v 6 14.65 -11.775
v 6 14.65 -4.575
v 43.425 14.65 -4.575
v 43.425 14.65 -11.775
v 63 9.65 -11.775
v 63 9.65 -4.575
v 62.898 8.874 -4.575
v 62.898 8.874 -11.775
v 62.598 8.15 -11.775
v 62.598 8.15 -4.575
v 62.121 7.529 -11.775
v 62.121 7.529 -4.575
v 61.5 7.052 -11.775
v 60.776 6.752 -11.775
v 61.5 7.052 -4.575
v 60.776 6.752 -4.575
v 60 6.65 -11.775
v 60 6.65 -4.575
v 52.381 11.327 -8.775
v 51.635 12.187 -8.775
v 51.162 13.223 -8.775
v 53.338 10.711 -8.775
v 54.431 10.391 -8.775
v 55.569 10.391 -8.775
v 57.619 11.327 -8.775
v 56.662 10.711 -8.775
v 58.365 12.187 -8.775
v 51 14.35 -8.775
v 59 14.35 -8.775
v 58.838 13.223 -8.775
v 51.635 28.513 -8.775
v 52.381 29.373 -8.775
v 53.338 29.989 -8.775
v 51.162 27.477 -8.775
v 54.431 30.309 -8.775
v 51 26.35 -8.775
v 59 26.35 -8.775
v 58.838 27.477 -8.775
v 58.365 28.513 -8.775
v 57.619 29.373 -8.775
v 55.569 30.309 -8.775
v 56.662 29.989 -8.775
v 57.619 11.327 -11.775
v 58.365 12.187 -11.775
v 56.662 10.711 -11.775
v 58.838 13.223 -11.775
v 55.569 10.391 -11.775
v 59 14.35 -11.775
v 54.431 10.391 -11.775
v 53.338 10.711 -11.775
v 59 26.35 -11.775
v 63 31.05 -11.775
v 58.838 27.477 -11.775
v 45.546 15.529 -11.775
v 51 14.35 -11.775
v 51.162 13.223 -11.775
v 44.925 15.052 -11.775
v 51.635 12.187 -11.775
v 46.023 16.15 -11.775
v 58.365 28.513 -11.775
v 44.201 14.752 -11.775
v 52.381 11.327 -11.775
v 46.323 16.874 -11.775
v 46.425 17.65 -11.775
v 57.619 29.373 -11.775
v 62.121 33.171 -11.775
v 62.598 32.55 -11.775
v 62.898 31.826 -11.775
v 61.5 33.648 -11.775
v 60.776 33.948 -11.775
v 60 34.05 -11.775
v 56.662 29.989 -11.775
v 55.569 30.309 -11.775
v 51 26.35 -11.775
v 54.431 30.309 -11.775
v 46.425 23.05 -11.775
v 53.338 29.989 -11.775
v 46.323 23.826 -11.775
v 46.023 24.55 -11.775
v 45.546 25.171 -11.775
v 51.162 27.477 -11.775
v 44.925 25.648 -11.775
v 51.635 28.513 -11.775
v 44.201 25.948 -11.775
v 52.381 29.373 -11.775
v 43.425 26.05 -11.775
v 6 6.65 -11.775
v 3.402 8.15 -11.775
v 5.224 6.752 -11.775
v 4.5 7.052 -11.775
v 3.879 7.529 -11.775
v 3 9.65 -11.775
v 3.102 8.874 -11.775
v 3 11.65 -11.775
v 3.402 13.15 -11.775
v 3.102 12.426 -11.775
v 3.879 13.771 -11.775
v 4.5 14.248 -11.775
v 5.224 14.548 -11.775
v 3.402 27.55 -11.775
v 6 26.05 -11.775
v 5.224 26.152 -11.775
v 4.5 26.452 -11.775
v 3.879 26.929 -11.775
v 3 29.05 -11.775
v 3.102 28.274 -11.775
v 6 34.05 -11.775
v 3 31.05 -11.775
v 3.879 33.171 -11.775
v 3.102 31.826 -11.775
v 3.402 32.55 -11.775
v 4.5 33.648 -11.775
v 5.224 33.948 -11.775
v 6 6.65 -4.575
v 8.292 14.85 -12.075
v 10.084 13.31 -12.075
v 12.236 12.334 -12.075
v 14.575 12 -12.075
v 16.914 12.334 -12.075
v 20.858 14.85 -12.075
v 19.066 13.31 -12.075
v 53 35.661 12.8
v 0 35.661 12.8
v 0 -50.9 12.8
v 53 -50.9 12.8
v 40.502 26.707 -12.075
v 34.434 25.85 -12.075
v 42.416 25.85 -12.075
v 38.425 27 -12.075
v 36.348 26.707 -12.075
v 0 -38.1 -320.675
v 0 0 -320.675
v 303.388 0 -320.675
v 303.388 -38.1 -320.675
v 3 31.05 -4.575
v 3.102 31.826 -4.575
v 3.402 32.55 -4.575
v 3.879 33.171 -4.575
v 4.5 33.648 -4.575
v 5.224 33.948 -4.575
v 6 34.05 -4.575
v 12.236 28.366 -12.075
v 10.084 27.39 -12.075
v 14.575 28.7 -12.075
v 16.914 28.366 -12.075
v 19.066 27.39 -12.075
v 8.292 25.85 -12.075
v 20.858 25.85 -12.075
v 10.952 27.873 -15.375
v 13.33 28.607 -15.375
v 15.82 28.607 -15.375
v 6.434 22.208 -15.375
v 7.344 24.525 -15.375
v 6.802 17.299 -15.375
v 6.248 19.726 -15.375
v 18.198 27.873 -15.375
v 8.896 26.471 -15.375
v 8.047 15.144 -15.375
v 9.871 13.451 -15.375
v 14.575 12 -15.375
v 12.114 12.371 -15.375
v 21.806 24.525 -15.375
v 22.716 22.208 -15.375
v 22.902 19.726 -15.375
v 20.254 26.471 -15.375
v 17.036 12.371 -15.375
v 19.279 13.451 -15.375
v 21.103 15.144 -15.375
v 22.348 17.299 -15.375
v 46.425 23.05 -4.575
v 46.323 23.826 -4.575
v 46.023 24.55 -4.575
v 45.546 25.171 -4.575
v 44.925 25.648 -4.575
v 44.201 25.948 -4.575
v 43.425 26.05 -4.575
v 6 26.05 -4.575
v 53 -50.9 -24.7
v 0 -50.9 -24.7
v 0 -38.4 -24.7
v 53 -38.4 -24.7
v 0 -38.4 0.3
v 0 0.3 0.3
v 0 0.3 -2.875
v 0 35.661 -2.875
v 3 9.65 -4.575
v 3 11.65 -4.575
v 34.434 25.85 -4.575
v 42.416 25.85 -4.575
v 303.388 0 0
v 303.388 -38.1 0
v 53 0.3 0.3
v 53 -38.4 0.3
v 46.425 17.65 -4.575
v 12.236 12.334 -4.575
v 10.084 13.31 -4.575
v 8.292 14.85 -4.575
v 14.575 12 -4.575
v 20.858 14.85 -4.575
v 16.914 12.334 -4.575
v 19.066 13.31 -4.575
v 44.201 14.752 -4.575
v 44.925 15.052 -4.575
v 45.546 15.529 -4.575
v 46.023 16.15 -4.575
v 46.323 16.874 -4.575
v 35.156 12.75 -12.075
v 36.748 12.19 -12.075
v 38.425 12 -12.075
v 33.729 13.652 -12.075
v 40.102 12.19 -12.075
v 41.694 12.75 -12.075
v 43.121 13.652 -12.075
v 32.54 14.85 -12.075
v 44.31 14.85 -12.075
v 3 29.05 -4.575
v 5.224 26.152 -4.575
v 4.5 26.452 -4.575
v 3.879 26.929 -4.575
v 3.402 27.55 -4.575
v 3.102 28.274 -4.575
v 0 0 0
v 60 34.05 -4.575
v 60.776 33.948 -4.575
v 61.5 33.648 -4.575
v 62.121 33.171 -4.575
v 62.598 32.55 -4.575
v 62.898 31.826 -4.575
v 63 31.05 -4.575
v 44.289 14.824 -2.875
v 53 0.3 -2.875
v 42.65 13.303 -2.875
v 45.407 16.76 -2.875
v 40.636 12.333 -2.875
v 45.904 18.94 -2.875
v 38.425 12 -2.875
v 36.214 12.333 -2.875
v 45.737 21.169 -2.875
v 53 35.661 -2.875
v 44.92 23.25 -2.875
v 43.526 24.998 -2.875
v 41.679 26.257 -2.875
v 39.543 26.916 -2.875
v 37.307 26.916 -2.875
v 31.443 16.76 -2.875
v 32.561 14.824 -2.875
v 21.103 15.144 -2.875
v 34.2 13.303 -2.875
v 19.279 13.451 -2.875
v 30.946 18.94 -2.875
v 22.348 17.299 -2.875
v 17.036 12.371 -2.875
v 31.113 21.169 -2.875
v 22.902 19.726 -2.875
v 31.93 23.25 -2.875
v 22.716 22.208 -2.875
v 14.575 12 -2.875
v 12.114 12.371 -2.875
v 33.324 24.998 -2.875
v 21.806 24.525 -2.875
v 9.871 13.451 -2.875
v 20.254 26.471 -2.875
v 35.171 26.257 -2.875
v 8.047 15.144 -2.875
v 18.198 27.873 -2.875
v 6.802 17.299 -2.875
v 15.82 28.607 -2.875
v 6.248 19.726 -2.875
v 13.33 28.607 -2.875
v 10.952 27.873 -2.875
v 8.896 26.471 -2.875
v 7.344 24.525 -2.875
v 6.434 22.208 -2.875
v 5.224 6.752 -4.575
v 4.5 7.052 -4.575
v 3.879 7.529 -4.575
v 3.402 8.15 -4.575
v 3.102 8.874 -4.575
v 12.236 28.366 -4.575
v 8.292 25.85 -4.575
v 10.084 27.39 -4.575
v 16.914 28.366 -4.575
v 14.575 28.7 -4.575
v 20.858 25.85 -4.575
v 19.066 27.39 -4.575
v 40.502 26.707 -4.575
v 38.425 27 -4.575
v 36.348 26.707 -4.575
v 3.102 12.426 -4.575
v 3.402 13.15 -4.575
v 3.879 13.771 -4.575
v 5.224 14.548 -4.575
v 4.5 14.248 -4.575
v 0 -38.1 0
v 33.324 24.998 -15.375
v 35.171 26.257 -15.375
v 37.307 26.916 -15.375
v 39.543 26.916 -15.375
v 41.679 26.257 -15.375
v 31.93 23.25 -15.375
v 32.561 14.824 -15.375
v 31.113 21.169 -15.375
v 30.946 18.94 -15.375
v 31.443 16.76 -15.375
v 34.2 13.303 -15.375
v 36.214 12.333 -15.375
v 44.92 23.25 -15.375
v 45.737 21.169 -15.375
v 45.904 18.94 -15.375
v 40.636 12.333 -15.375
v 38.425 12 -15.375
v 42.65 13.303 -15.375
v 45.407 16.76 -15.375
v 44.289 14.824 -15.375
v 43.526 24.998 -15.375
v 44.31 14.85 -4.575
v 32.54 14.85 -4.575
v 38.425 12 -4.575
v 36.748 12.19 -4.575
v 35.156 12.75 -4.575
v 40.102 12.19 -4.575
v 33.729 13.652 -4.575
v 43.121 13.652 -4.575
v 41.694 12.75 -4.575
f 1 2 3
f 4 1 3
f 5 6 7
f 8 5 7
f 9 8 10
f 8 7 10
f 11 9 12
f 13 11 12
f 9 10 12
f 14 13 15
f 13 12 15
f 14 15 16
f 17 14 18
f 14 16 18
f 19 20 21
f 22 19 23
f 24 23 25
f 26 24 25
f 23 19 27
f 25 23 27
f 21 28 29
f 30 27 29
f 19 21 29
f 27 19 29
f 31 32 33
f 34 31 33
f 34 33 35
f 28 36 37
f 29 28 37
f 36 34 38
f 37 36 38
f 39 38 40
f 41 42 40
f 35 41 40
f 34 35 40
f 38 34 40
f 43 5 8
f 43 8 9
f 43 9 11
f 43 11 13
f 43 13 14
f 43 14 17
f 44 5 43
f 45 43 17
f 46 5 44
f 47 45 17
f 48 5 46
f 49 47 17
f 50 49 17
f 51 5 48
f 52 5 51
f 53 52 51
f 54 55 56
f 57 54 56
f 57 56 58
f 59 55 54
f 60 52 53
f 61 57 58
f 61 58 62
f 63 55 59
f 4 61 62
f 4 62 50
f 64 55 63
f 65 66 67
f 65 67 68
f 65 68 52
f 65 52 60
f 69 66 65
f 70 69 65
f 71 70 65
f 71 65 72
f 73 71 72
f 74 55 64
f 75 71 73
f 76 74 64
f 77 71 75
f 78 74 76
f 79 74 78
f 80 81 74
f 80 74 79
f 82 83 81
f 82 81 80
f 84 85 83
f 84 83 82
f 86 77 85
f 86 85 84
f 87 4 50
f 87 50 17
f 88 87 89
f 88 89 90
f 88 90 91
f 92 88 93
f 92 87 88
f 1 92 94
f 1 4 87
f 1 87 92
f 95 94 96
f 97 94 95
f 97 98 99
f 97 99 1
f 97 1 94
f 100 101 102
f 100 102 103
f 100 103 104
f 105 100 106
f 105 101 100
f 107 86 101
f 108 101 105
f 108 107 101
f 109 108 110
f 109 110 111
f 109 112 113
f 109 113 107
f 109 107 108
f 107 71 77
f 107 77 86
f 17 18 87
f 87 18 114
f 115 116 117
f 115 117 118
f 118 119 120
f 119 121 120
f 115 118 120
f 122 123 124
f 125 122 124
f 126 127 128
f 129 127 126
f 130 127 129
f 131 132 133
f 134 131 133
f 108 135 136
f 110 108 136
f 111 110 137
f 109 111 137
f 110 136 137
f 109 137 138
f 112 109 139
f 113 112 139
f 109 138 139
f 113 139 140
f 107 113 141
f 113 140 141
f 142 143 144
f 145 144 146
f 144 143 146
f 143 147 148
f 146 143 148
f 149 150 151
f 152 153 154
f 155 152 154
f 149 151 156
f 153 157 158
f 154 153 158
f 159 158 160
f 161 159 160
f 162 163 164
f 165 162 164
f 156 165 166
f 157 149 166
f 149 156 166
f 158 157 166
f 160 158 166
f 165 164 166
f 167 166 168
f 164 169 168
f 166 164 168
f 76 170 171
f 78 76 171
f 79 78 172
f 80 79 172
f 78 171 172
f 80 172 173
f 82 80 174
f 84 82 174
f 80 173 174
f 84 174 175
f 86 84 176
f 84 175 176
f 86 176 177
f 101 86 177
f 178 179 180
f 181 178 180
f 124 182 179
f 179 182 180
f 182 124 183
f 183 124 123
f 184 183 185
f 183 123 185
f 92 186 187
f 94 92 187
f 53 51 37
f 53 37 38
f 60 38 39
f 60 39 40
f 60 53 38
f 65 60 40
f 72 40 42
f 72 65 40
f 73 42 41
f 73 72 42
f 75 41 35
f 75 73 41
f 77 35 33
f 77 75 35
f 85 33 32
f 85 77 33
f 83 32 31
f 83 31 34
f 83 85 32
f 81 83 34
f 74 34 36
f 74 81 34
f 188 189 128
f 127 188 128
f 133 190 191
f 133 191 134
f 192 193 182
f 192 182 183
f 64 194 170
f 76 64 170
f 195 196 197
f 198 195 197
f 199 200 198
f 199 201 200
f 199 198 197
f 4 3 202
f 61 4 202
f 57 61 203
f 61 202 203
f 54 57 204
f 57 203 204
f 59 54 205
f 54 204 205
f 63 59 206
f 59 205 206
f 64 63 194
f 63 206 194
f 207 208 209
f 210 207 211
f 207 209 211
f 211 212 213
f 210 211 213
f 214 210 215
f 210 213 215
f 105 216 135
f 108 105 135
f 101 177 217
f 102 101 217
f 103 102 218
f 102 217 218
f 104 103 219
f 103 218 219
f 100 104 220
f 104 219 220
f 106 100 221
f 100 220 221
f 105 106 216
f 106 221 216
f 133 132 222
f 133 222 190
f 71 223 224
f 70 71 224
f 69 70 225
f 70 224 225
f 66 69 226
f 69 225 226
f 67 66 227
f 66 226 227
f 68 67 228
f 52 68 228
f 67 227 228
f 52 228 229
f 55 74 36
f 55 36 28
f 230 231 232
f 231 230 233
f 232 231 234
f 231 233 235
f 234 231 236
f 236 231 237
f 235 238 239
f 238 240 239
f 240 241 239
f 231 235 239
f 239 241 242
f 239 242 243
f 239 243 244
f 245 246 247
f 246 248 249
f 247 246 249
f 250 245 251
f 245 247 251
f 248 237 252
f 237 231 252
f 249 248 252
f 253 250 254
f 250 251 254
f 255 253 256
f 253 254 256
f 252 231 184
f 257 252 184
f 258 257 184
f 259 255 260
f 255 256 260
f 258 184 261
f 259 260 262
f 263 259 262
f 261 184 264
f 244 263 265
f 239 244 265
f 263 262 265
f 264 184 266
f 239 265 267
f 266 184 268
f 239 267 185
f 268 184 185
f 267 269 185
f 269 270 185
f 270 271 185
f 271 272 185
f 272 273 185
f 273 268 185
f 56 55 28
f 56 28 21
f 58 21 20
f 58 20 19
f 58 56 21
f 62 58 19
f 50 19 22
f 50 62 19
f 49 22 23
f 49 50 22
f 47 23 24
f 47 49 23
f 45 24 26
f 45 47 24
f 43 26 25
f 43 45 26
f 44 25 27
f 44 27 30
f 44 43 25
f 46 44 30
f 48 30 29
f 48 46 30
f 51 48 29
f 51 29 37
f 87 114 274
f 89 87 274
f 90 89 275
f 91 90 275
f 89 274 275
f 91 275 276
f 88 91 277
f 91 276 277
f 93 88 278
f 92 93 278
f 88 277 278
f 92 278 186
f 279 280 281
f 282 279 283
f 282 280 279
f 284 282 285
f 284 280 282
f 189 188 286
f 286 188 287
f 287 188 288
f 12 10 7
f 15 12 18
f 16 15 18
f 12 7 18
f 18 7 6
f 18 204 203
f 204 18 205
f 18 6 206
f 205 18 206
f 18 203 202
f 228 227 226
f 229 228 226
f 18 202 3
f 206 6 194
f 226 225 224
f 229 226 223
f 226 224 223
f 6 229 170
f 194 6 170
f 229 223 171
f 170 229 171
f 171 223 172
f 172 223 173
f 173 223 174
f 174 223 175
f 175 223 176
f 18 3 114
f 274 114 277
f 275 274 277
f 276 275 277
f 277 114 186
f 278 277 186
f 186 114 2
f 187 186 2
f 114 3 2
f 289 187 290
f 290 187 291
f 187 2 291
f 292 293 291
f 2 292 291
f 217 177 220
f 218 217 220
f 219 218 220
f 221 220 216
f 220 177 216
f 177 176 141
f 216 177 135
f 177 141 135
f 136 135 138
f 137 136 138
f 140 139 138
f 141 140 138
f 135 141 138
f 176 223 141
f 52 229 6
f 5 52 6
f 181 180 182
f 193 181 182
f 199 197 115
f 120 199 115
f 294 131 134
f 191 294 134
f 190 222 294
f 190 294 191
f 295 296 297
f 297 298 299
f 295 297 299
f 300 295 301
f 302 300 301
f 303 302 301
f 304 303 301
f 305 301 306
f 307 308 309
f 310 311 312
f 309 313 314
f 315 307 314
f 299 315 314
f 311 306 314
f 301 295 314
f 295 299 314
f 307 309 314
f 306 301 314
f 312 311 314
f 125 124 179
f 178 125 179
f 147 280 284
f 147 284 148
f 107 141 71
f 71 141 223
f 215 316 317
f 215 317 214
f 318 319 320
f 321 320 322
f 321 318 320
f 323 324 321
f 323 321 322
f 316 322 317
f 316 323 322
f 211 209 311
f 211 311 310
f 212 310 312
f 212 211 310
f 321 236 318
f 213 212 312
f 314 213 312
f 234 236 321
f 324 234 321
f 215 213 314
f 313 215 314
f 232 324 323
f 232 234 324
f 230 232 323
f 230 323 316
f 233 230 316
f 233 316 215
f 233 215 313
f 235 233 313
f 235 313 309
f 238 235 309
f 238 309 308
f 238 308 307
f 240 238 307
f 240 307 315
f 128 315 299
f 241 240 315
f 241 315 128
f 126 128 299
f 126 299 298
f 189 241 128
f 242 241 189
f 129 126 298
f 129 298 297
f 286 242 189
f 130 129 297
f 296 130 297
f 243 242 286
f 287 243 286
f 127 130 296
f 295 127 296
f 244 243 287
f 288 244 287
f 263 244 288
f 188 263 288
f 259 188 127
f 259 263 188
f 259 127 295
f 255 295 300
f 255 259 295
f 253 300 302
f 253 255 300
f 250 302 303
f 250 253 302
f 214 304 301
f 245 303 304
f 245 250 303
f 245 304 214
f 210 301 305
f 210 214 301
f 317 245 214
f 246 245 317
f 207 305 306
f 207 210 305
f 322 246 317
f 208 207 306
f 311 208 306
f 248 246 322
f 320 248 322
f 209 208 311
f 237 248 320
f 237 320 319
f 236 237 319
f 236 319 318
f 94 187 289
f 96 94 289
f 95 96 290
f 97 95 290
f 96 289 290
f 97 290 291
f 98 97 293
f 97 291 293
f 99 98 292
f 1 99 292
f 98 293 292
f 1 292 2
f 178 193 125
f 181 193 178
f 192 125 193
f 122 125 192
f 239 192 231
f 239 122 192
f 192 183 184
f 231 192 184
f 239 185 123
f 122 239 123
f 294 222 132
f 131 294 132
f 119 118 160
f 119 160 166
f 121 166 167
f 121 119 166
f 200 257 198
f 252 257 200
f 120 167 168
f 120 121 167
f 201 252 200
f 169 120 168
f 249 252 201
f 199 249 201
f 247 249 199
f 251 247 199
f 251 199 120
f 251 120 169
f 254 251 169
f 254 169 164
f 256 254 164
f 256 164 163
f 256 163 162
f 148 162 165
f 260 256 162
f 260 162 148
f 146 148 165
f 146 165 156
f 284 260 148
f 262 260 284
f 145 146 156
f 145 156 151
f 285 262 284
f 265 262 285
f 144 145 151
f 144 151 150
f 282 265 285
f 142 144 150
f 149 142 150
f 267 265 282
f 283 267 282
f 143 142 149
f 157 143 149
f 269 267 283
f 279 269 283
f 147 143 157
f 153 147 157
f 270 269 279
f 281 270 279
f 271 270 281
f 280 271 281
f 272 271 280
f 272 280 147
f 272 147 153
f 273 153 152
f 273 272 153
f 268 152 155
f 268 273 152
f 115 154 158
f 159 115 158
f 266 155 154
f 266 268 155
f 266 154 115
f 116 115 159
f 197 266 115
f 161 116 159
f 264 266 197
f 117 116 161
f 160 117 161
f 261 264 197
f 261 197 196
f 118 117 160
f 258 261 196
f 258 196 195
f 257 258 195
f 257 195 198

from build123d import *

# Parameters (mm, degrees)
SKETCH1_W            = 303.387938005
SKETCH1_H            = 320.675
BOSS_EXTRUDE1_DEPTH  = 38.1
BOSS_EXTRUDE2_DEPTH  = 53
BOSS_EXTRUDE4_START  = -2.875
SKETCH2_R            = 8.35
SKETCH2_R_2          = 7.5
BOSS_EXTRUDE4_DEPTH  = 12.5
SKETCH4_W            = 7.5
SKETCH4_H            = 2.85
CUT_EXTRUDE1_DEPTH   = 411.021200822
BOSS_EXTRUDE11_DEPTH = 7.2
CUT_EXTRUDE2_DEPTH   = 3


with BuildPart() as part:
    # Sketch1 → Boss-Extrude1 (new body)
    with BuildSketch(Plane(origin=(0, 0, 0), x_dir=(1, 0, 0), z_dir=(0, 1, 0))):
        with Locations((151.693969003, 160.3375)):
            Rectangle(SKETCH1_W, SKETCH1_H)
    extrude(amount=-BOSS_EXTRUDE1_DEPTH)


with BuildPart() as body_2:
    # Sketch3 → Boss-Extrude2 (new body)
    with BuildSketch(Plane(origin=(0, 0, 0), x_dir=(0, 0, -1), z_dir=(1, 0, 0))):
        Polygon((24.7, -38.4), (-0.3, -38.4), (-0.3, 0.3), (2.875, 0.3), (2.875, 35.661425503), (-0.3, 35.661425503), (-12.8, 35.661425503), (-12.8, -50.9), (24.7, -50.9), align=None)
    extrude(amount=BOSS_EXTRUDE2_DEPTH)

    # Sketch2 → Boss-Extrude4 (add)
    with BuildSketch(Plane.XY.offset(BOSS_EXTRUDE4_START)):
        with Locations(Location((14.575, 20.35, 0), (0, 0, 270))):
            Circle(SKETCH2_R)
        with Locations(Location((38.425, 19.5, 0), (0, 0, 270))):
            Circle(SKETCH2_R_2)
    extrude(amount=-BOSS_EXTRUDE4_DEPTH)

    # Sketch4 → Cut-Extrude1 (cut, through all)
    with BuildSketch(Plane(origin=(53, 0, 0), x_dir=(0, 0, -1), z_dir=(1, 0, 0))):
        with Locations((8.325, 27.275)):
            Rectangle(SKETCH4_W, SKETCH4_H)
        with Locations((8.325, 13.425)):
            Rectangle(SKETCH4_W, SKETCH4_H)
    extrude(amount=-CUT_EXTRUDE1_DEPTH, mode=Mode.SUBTRACT)


with BuildPart() as body_3:
    # Sketch5 → Boss-Extrude11 (new body)
    with BuildSketch(Plane(origin=(0, 0, -4.575), x_dir=(-1, 0, 0), z_dir=(0, 0, -1))):
        with BuildLine():
            Line((-42.078423052, 26.05), (-34.771576948, 26.05))
            ThreePointArc((-34.771576948, 26.05), (-38.425, 27), (-42.078423052, 26.05))
        make_face()
        with BuildLine():
            ThreePointArc((-60, 34.05), (-62.121320344, 33.171320344), (-63, 31.05))
            Line((-63, 31.05), (-63, 25.125357932))
            Line((-63, 25.125357932), (-63, 11.495995523))
            Line((-63, 11.495995523), (-63, 9.65))
            ThreePointArc((-63, 9.65), (-62.121320344, 7.528679656), (-60, 6.65))
            Line((-60, 6.65), (-6, 6.65))
            ThreePointArc((-6, 6.65), (-3.878679656, 7.528679656), (-3, 9.65))
            Line((-3, 9.65), (-3, 11.65))
            ThreePointArc((-3, 11.65), (-3.878679656, 13.771320344), (-6, 14.65))
            Line((-6, 14.65), (-43.425, 14.65))
            ThreePointArc((-43.425, 14.65), (-45.546320344, 15.528679656), (-46.425, 17.65))
            Line((-46.425, 17.65), (-46.425, 23.05))
            ThreePointArc((-46.425, 23.05), (-45.546320344, 25.171320344), (-43.425, 26.05))
            Line((-43.425, 26.05), (-42.078423052, 26.05))
            ThreePointArc((-42.078423052, 26.05), (-38.425, 27), (-34.771576948, 26.05))
            Line((-34.771576948, 26.05), (-6, 26.05))
            ThreePointArc((-6, 26.05), (-3.878679656, 26.928679656), (-3, 29.05))
            Line((-3, 29.05), (-3, 31.05))
            ThreePointArc((-3, 31.05), (-3.878679656, 33.171320344), (-6, 34.05))
            Line((-6, 34.05), (-60, 34.05))
        make_face()
    extrude(amount=BOSS_EXTRUDE11_DEPTH)

    # Sketch6 → Cut-Extrude2 (cut)
    with BuildSketch(Plane(origin=(0, 0, -11.775), x_dir=(-1, 0, 0), z_dir=(0, 0, -1))):
        with BuildLine():
            Line((-51, 26.35), (-51, 14.35))
            ThreePointArc((-51, 14.35), (-55, 10.35), (-59, 14.35))
            Line((-59, 14.35), (-59, 26.35))
            ThreePointArc((-59, 26.35), (-55, 30.35), (-51, 26.35))
        make_face()
    extrude(amount=-CUT_EXTRUDE2_DEPTH, mode=Mode.SUBTRACT)


solid = Compound([part.part, body_2.part, body_3.part])
